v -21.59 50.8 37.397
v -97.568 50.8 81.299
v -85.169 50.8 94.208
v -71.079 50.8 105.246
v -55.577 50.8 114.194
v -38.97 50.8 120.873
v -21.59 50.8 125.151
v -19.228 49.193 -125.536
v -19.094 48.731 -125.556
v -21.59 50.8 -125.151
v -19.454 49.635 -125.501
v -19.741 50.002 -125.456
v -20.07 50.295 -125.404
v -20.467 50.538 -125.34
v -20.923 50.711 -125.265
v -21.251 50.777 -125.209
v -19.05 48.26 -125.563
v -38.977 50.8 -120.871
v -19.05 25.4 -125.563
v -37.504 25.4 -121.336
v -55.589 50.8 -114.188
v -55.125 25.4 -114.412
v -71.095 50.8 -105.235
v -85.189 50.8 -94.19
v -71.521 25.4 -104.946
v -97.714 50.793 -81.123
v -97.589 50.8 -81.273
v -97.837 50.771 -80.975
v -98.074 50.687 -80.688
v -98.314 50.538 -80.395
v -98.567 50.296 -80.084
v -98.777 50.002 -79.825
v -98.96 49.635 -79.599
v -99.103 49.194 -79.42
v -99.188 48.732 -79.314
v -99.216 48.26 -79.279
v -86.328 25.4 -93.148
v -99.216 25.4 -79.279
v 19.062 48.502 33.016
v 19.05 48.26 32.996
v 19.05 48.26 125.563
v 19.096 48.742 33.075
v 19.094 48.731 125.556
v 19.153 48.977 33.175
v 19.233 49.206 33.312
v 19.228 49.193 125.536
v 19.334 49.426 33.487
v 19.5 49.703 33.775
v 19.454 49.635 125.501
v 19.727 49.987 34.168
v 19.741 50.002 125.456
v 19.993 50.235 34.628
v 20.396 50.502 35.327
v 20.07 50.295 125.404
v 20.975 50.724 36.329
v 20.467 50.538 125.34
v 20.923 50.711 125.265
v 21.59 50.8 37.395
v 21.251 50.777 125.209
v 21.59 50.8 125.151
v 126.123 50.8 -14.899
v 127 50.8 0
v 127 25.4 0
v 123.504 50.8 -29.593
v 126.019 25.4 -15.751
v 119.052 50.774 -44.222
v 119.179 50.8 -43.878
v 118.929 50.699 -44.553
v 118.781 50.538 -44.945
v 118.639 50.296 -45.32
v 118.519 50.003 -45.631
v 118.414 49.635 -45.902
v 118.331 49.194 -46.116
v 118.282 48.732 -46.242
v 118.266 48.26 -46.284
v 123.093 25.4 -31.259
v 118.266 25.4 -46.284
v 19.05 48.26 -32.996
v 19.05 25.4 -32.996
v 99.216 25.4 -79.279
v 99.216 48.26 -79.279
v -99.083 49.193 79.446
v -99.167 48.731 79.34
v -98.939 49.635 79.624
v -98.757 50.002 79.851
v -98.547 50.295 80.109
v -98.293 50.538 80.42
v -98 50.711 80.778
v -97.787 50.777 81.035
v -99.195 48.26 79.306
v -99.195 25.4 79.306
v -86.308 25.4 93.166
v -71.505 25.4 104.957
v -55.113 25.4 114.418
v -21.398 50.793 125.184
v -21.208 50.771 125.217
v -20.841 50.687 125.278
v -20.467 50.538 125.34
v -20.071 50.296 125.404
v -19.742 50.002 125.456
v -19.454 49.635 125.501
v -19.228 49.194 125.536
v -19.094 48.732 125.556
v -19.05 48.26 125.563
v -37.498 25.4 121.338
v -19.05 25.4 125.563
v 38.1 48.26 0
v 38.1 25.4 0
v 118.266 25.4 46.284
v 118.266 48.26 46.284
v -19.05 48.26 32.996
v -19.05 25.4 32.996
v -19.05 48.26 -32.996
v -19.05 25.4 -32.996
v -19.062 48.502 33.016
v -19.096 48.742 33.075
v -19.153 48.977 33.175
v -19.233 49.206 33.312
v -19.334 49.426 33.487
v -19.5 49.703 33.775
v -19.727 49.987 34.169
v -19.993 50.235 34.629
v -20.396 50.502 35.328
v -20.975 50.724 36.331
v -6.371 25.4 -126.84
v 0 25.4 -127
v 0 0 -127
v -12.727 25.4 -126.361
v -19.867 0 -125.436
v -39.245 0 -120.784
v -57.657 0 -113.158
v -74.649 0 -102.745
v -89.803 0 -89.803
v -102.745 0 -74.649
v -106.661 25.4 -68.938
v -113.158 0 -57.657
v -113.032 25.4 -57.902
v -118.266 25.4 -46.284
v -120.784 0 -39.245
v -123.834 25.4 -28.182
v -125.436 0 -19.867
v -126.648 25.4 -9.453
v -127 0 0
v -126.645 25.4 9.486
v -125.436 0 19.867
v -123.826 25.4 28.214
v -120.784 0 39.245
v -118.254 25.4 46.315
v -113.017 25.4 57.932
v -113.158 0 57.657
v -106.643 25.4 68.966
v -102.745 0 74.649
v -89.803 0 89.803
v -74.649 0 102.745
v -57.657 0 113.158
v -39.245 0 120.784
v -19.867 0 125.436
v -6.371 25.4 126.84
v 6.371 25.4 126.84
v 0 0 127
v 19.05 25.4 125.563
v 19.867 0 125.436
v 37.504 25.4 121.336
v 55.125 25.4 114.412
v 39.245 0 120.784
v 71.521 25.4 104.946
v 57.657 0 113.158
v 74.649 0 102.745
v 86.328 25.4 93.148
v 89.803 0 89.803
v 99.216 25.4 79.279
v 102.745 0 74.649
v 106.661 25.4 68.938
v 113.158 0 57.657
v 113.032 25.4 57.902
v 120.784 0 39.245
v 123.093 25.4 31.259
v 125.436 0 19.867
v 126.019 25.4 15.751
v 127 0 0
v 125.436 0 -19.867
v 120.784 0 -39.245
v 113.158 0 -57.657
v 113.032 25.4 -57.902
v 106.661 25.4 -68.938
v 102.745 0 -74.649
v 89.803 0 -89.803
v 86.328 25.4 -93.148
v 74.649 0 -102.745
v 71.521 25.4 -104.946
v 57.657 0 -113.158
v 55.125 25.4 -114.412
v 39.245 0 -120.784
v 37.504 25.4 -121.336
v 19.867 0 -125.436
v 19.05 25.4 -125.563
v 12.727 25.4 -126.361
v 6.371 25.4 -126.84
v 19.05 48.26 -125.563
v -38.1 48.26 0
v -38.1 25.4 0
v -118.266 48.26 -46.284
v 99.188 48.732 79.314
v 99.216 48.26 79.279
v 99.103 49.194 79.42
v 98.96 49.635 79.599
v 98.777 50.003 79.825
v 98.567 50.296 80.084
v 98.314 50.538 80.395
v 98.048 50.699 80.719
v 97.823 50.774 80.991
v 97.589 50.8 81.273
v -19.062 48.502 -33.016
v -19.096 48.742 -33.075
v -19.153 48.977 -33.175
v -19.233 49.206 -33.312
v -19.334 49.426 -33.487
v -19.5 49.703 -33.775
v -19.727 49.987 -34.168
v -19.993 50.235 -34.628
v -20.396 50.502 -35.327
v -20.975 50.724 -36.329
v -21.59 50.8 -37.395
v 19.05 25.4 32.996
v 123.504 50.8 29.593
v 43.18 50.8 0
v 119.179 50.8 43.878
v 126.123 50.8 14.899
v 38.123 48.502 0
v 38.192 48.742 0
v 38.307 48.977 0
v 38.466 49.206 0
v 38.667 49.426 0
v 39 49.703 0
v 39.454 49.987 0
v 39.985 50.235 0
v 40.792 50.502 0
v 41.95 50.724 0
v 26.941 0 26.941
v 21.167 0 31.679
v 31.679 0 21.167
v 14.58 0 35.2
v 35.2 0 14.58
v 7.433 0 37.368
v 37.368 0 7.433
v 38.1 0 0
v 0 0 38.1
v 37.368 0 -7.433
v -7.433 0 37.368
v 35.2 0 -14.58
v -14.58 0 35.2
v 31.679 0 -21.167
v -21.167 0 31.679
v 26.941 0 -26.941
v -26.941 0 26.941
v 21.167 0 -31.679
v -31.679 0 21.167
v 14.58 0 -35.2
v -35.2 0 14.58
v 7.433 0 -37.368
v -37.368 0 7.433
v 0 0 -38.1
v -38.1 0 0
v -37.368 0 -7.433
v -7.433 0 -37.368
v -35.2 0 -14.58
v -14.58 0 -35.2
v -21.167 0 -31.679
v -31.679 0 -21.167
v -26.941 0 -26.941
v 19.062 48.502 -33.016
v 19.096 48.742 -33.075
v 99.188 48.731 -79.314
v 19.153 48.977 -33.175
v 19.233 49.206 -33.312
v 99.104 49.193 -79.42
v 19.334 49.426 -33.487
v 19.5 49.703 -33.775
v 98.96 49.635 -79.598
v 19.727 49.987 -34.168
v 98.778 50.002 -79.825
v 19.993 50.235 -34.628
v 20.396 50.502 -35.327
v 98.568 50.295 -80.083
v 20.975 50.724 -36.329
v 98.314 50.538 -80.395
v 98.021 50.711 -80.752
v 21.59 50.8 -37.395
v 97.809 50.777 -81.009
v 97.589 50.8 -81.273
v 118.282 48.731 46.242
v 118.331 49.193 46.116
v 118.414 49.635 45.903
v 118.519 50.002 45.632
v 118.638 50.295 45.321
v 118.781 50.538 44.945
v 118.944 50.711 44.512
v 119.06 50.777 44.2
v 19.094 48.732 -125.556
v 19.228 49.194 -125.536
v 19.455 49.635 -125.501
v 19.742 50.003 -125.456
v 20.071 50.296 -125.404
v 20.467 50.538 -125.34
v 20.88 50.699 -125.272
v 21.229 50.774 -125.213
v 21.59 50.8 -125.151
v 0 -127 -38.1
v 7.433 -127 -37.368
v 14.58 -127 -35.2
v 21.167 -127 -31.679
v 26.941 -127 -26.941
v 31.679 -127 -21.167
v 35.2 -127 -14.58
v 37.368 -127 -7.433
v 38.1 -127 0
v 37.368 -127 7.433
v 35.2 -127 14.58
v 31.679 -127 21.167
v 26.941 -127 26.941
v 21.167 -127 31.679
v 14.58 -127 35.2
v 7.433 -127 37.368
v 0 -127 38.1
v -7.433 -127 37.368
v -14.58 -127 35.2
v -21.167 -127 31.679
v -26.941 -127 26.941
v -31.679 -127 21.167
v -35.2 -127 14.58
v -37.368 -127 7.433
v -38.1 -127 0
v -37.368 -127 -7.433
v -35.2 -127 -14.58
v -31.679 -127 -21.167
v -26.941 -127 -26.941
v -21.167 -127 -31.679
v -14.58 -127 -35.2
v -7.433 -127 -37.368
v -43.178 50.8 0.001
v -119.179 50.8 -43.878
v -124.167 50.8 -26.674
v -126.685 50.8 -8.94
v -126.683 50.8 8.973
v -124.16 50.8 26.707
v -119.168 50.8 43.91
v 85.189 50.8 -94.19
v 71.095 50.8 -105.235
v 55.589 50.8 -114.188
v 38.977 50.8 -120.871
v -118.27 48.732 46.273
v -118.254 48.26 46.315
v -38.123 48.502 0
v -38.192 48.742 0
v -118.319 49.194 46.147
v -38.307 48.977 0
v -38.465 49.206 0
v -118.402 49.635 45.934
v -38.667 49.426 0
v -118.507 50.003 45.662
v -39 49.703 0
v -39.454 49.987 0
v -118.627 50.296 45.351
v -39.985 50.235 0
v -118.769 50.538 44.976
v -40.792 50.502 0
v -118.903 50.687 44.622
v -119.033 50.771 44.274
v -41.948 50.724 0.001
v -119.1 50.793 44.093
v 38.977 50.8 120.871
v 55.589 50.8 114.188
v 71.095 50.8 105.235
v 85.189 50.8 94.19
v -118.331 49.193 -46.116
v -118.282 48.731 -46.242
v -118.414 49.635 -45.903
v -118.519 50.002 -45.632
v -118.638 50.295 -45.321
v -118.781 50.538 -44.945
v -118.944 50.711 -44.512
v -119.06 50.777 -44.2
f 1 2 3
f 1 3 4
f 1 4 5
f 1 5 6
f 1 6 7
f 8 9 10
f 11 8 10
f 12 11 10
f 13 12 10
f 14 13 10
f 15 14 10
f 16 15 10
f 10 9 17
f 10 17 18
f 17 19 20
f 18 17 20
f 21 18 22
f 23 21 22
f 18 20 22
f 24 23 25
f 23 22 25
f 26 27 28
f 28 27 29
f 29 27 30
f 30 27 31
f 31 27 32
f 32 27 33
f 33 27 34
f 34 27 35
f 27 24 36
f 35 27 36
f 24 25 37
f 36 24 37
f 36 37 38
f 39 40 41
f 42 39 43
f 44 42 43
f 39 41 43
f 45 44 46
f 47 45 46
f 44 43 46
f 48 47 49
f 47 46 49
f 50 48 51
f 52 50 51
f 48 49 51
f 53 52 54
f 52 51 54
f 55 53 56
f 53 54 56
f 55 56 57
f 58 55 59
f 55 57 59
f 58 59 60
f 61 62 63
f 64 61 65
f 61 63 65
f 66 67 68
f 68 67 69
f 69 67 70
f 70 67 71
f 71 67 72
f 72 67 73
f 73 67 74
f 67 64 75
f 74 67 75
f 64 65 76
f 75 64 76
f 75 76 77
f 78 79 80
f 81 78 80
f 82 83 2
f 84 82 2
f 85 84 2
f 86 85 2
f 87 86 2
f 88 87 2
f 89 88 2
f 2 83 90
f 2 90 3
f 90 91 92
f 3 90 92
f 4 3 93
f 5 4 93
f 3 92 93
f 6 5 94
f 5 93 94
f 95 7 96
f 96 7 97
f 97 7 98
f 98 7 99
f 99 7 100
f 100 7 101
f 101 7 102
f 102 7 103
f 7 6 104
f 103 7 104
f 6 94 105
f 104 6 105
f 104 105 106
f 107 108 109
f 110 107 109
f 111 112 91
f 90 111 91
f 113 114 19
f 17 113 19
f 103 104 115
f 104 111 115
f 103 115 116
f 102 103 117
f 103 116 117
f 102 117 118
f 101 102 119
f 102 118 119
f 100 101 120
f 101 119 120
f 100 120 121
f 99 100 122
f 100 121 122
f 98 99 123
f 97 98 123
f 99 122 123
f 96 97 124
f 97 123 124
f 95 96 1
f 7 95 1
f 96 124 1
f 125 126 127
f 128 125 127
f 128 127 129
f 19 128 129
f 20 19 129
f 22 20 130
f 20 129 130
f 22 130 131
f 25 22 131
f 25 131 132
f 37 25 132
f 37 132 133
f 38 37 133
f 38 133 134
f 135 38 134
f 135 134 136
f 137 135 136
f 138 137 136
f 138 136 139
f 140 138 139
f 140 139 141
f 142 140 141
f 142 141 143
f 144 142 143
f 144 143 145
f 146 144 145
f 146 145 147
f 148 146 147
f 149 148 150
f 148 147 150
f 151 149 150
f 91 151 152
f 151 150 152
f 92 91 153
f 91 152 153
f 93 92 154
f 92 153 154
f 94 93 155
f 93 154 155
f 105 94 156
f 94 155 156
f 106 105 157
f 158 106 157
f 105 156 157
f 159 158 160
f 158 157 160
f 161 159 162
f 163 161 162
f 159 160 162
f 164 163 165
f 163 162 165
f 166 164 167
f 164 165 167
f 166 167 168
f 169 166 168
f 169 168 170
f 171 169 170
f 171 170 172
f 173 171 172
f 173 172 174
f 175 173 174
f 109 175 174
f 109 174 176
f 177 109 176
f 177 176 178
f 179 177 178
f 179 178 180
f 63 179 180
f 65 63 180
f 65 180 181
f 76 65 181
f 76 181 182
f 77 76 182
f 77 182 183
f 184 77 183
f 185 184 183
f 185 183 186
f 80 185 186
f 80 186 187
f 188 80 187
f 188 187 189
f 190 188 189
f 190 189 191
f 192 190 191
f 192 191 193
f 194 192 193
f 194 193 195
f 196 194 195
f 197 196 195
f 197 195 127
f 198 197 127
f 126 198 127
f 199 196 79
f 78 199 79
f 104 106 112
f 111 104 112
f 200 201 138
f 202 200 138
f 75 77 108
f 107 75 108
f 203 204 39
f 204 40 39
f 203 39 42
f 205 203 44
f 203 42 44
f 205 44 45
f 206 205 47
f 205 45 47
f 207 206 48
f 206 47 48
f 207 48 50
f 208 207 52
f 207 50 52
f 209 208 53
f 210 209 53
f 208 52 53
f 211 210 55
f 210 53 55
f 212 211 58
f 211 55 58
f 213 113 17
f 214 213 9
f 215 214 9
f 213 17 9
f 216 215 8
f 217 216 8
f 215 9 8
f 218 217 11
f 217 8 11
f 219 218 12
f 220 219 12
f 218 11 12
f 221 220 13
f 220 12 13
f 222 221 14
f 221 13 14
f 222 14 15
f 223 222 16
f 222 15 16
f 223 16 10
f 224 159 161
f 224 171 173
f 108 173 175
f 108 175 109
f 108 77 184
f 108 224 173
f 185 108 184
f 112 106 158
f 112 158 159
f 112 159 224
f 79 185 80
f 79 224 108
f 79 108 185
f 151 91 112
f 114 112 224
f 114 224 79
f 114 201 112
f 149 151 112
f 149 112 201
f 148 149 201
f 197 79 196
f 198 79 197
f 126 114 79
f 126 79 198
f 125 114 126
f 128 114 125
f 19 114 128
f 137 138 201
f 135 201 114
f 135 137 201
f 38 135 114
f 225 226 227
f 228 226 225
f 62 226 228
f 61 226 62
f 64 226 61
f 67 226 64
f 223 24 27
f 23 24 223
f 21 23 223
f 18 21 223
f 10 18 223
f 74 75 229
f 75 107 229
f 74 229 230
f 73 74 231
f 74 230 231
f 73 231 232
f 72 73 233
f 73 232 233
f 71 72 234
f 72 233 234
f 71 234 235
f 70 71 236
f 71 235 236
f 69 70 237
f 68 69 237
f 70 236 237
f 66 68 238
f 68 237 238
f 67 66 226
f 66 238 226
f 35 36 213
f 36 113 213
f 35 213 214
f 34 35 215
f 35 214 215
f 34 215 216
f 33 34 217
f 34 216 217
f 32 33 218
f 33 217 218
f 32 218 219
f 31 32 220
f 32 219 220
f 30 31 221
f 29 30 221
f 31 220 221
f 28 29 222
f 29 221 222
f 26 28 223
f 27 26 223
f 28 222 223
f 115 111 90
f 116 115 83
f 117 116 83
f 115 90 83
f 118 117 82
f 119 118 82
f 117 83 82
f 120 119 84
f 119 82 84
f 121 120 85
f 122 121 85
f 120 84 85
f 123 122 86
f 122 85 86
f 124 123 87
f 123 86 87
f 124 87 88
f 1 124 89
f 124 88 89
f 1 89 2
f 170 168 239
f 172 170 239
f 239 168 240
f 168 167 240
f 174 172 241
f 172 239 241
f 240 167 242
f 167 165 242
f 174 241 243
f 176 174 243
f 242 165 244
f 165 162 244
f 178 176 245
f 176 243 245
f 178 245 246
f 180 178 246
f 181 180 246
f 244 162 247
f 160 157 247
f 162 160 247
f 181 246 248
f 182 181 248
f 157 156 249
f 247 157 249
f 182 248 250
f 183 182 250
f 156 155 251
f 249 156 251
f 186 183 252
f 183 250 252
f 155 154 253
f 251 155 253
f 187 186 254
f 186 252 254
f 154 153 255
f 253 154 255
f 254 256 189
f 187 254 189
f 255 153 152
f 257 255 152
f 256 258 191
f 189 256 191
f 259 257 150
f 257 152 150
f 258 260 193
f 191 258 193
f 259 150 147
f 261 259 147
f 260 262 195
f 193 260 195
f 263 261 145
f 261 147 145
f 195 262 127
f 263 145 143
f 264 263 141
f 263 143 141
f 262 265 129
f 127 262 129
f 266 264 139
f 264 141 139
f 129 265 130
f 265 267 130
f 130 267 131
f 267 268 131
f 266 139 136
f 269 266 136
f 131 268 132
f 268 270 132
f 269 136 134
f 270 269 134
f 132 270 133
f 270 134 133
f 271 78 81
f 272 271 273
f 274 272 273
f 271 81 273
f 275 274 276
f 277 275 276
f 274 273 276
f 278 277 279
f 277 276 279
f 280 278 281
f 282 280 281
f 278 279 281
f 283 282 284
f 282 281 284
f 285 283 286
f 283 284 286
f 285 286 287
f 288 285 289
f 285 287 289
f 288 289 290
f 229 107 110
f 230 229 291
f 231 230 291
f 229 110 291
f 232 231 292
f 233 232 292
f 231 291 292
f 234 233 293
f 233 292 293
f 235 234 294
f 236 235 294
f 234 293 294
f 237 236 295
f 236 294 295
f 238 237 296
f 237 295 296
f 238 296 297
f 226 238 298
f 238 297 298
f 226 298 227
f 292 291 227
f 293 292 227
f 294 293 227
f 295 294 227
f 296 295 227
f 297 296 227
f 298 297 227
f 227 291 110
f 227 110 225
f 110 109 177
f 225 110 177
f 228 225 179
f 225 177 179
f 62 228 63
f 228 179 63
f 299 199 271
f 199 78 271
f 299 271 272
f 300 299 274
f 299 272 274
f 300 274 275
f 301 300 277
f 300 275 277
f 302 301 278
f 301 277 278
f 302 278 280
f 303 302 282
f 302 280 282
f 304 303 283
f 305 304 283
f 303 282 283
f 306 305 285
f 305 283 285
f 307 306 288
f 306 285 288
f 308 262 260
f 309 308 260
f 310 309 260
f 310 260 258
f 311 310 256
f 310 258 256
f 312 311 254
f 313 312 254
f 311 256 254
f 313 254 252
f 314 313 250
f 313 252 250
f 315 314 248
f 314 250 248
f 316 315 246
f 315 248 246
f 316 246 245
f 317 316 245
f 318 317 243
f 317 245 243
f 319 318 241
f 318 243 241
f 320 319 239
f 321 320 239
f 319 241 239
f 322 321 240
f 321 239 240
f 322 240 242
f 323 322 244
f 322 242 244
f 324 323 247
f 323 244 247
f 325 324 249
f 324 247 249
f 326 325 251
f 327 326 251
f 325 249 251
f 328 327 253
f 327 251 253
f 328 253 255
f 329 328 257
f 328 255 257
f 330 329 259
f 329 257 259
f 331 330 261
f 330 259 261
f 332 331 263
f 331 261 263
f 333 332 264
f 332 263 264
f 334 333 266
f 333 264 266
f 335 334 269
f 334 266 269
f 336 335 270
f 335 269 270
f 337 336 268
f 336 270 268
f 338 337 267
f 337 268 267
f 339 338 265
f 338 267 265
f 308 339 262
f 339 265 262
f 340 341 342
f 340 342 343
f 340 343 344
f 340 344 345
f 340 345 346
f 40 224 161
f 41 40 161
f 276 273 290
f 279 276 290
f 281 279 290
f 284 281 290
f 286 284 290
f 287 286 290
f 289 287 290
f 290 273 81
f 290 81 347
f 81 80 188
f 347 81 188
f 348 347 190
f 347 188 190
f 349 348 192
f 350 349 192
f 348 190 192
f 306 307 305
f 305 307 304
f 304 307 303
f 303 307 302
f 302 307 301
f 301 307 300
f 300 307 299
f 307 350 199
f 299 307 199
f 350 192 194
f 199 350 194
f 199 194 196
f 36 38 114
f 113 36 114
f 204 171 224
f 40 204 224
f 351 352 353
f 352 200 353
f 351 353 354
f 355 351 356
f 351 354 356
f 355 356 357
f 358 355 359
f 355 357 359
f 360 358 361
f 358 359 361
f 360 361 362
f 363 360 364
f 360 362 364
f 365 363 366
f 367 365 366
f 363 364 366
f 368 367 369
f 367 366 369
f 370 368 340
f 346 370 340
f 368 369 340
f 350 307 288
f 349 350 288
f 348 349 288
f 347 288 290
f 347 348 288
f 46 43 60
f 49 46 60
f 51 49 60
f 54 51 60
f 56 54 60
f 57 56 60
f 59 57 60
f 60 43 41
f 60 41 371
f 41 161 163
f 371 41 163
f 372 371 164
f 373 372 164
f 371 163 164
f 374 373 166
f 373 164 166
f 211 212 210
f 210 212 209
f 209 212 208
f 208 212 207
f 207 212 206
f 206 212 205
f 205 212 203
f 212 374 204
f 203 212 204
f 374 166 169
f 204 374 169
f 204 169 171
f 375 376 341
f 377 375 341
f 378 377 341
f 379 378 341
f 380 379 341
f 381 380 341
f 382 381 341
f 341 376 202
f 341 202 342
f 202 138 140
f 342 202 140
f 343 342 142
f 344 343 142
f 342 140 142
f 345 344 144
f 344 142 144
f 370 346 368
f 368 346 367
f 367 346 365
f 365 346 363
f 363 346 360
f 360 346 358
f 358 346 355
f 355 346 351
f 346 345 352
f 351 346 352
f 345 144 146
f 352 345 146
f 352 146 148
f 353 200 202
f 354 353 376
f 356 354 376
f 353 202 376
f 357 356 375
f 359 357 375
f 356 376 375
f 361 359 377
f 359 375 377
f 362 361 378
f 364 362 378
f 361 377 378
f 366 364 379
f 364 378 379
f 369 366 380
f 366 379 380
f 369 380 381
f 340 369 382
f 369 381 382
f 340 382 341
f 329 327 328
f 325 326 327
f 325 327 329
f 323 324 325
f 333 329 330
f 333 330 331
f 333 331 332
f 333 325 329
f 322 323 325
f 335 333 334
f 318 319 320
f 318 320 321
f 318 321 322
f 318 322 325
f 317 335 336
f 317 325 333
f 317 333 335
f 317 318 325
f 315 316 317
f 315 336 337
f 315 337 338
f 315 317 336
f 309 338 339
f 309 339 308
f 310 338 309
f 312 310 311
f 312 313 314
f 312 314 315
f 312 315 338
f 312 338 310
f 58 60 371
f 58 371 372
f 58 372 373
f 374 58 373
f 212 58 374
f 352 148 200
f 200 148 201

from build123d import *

# Parameters (mm, degrees)
SKETCH1_R           = 127
BOSS_EXTRUDE1_DEPTH = 25.4
BOSS_EXTRUDE2_DEPTH = 25.4
SKETCH3_R           = 38.1
BOSS_EXTRUDE3_DEPTH = 127
FILLET1_R           = 2.54


with BuildPart() as part:
    # Sketch1 → Boss-Extrude1 (new body)
    with BuildSketch(Plane(origin=(0, 0, 0), x_dir=(1, 0, 0), z_dir=(0, 1, 0))):
        with Locations(Location((0, 0, 0), (0, 0, 90))):
            Circle(SKETCH1_R)
    extrude(amount=BOSS_EXTRUDE1_DEPTH)

    # Sketch2 → Boss-Extrude2 (add)
    with BuildSketch(Plane(origin=(0, 25.4, 0), x_dir=(1, 0, 0), z_dir=(0, 1, 0))):
        with BuildLine():
            Line((-118.25364463, -46.314960129), (-38.1, 0))
            Line((-38.1, 0), (-118.265853064, 46.283776846))
            ThreePointArc((-118.265853064, 46.283776846), (-126.999998896, -0.016743976), (-118.25364463, -46.314960129))
        make_face()
        with BuildLine():
            Line((-99.215853064, 79.27934473), (-19.05, 32.995567884))
            Line((-19.05, 32.995567884), (-19.05, 125.563121576))
            ThreePointArc((-19.05, 125.563121576), (-63.5, 109.985226281), (-99.215853064, 79.27934473))
        make_face()
        with BuildLine():
            Line((19.05, 125.563121576), (19.05, 32.995567884))
            Line((19.05, 32.995567884), (99.215853064, 79.27934473))
            ThreePointArc((99.215853064, 79.27934473), (63.5, 109.985226281), (19.05, 125.563121576))
        make_face()
        with BuildLine():
            Line((118.265853064, 46.283776846), (38.1, 0))
            Line((38.1, 0), (118.265853064, -46.283776846))
            ThreePointArc((118.265853064, -46.283776846), (124.79736243, -23.550336101), (127, 0))
            ThreePointArc((127, 0), (124.79736243, 23.550336101), (118.265853064, 46.283776846))
        make_face()
        with BuildLine():
            Line((99.215853064, -79.27934473), (19.05, -32.995567884))
            Line((19.05, -32.995567884), (19.05, -125.563121576))
            ThreePointArc((19.05, -125.563121576), (63.5, -109.985226281), (99.215853064, -79.27934473))
        make_face()
        with BuildLine():
            Line((-19.05, -125.563121576), (-19.05, -32.995567884))
            Line((-19.05, -32.995567884), (-99.194944867, -79.305503673))
            ThreePointArc((-99.194944867, -79.305503673), (-63.485498739, -109.993597313), (-19.05, -125.563121576))
        make_face()
    extrude(amount=BOSS_EXTRUDE2_DEPTH)

    # Sketch3 → Boss-Extrude3 (add)
    with BuildSketch(Plane.XZ):
        with Locations(Location((0, 0, 0), (0, 0, 270))):
            Circle(SKETCH3_R)
    extrude(amount=BOSS_EXTRUDE3_DEPTH)

    # Fillet1
    fillet1_edges = [part.edges().sort_by_distance(p)[0] for p in [
        (-59.132926532, 50.8, -56.137456307),
        (-19.05, 50.8, -79.27934473),
        (19.05, 50.8, -79.27934473),
        (59.132926532, 50.8, -56.137456307),
        (78.182926532, 50.8, -23.141888423),
        (78.182926532, 50.8, 23.141888423),
        (59.132926532, 50.8, 56.137456307),
        (19.05, 50.8, 79.27934473),
        (-19.05, 50.8, 79.27934473),
        (-59.122472434, 50.8, 56.150535779),
        (-78.176822315, 50.8, 23.157480064),
        (-78.182926532, 50.8, -23.141888423),
    ]]
    fillet(fillet1_edges, radius=FILLET1_R)


solid = part.part
